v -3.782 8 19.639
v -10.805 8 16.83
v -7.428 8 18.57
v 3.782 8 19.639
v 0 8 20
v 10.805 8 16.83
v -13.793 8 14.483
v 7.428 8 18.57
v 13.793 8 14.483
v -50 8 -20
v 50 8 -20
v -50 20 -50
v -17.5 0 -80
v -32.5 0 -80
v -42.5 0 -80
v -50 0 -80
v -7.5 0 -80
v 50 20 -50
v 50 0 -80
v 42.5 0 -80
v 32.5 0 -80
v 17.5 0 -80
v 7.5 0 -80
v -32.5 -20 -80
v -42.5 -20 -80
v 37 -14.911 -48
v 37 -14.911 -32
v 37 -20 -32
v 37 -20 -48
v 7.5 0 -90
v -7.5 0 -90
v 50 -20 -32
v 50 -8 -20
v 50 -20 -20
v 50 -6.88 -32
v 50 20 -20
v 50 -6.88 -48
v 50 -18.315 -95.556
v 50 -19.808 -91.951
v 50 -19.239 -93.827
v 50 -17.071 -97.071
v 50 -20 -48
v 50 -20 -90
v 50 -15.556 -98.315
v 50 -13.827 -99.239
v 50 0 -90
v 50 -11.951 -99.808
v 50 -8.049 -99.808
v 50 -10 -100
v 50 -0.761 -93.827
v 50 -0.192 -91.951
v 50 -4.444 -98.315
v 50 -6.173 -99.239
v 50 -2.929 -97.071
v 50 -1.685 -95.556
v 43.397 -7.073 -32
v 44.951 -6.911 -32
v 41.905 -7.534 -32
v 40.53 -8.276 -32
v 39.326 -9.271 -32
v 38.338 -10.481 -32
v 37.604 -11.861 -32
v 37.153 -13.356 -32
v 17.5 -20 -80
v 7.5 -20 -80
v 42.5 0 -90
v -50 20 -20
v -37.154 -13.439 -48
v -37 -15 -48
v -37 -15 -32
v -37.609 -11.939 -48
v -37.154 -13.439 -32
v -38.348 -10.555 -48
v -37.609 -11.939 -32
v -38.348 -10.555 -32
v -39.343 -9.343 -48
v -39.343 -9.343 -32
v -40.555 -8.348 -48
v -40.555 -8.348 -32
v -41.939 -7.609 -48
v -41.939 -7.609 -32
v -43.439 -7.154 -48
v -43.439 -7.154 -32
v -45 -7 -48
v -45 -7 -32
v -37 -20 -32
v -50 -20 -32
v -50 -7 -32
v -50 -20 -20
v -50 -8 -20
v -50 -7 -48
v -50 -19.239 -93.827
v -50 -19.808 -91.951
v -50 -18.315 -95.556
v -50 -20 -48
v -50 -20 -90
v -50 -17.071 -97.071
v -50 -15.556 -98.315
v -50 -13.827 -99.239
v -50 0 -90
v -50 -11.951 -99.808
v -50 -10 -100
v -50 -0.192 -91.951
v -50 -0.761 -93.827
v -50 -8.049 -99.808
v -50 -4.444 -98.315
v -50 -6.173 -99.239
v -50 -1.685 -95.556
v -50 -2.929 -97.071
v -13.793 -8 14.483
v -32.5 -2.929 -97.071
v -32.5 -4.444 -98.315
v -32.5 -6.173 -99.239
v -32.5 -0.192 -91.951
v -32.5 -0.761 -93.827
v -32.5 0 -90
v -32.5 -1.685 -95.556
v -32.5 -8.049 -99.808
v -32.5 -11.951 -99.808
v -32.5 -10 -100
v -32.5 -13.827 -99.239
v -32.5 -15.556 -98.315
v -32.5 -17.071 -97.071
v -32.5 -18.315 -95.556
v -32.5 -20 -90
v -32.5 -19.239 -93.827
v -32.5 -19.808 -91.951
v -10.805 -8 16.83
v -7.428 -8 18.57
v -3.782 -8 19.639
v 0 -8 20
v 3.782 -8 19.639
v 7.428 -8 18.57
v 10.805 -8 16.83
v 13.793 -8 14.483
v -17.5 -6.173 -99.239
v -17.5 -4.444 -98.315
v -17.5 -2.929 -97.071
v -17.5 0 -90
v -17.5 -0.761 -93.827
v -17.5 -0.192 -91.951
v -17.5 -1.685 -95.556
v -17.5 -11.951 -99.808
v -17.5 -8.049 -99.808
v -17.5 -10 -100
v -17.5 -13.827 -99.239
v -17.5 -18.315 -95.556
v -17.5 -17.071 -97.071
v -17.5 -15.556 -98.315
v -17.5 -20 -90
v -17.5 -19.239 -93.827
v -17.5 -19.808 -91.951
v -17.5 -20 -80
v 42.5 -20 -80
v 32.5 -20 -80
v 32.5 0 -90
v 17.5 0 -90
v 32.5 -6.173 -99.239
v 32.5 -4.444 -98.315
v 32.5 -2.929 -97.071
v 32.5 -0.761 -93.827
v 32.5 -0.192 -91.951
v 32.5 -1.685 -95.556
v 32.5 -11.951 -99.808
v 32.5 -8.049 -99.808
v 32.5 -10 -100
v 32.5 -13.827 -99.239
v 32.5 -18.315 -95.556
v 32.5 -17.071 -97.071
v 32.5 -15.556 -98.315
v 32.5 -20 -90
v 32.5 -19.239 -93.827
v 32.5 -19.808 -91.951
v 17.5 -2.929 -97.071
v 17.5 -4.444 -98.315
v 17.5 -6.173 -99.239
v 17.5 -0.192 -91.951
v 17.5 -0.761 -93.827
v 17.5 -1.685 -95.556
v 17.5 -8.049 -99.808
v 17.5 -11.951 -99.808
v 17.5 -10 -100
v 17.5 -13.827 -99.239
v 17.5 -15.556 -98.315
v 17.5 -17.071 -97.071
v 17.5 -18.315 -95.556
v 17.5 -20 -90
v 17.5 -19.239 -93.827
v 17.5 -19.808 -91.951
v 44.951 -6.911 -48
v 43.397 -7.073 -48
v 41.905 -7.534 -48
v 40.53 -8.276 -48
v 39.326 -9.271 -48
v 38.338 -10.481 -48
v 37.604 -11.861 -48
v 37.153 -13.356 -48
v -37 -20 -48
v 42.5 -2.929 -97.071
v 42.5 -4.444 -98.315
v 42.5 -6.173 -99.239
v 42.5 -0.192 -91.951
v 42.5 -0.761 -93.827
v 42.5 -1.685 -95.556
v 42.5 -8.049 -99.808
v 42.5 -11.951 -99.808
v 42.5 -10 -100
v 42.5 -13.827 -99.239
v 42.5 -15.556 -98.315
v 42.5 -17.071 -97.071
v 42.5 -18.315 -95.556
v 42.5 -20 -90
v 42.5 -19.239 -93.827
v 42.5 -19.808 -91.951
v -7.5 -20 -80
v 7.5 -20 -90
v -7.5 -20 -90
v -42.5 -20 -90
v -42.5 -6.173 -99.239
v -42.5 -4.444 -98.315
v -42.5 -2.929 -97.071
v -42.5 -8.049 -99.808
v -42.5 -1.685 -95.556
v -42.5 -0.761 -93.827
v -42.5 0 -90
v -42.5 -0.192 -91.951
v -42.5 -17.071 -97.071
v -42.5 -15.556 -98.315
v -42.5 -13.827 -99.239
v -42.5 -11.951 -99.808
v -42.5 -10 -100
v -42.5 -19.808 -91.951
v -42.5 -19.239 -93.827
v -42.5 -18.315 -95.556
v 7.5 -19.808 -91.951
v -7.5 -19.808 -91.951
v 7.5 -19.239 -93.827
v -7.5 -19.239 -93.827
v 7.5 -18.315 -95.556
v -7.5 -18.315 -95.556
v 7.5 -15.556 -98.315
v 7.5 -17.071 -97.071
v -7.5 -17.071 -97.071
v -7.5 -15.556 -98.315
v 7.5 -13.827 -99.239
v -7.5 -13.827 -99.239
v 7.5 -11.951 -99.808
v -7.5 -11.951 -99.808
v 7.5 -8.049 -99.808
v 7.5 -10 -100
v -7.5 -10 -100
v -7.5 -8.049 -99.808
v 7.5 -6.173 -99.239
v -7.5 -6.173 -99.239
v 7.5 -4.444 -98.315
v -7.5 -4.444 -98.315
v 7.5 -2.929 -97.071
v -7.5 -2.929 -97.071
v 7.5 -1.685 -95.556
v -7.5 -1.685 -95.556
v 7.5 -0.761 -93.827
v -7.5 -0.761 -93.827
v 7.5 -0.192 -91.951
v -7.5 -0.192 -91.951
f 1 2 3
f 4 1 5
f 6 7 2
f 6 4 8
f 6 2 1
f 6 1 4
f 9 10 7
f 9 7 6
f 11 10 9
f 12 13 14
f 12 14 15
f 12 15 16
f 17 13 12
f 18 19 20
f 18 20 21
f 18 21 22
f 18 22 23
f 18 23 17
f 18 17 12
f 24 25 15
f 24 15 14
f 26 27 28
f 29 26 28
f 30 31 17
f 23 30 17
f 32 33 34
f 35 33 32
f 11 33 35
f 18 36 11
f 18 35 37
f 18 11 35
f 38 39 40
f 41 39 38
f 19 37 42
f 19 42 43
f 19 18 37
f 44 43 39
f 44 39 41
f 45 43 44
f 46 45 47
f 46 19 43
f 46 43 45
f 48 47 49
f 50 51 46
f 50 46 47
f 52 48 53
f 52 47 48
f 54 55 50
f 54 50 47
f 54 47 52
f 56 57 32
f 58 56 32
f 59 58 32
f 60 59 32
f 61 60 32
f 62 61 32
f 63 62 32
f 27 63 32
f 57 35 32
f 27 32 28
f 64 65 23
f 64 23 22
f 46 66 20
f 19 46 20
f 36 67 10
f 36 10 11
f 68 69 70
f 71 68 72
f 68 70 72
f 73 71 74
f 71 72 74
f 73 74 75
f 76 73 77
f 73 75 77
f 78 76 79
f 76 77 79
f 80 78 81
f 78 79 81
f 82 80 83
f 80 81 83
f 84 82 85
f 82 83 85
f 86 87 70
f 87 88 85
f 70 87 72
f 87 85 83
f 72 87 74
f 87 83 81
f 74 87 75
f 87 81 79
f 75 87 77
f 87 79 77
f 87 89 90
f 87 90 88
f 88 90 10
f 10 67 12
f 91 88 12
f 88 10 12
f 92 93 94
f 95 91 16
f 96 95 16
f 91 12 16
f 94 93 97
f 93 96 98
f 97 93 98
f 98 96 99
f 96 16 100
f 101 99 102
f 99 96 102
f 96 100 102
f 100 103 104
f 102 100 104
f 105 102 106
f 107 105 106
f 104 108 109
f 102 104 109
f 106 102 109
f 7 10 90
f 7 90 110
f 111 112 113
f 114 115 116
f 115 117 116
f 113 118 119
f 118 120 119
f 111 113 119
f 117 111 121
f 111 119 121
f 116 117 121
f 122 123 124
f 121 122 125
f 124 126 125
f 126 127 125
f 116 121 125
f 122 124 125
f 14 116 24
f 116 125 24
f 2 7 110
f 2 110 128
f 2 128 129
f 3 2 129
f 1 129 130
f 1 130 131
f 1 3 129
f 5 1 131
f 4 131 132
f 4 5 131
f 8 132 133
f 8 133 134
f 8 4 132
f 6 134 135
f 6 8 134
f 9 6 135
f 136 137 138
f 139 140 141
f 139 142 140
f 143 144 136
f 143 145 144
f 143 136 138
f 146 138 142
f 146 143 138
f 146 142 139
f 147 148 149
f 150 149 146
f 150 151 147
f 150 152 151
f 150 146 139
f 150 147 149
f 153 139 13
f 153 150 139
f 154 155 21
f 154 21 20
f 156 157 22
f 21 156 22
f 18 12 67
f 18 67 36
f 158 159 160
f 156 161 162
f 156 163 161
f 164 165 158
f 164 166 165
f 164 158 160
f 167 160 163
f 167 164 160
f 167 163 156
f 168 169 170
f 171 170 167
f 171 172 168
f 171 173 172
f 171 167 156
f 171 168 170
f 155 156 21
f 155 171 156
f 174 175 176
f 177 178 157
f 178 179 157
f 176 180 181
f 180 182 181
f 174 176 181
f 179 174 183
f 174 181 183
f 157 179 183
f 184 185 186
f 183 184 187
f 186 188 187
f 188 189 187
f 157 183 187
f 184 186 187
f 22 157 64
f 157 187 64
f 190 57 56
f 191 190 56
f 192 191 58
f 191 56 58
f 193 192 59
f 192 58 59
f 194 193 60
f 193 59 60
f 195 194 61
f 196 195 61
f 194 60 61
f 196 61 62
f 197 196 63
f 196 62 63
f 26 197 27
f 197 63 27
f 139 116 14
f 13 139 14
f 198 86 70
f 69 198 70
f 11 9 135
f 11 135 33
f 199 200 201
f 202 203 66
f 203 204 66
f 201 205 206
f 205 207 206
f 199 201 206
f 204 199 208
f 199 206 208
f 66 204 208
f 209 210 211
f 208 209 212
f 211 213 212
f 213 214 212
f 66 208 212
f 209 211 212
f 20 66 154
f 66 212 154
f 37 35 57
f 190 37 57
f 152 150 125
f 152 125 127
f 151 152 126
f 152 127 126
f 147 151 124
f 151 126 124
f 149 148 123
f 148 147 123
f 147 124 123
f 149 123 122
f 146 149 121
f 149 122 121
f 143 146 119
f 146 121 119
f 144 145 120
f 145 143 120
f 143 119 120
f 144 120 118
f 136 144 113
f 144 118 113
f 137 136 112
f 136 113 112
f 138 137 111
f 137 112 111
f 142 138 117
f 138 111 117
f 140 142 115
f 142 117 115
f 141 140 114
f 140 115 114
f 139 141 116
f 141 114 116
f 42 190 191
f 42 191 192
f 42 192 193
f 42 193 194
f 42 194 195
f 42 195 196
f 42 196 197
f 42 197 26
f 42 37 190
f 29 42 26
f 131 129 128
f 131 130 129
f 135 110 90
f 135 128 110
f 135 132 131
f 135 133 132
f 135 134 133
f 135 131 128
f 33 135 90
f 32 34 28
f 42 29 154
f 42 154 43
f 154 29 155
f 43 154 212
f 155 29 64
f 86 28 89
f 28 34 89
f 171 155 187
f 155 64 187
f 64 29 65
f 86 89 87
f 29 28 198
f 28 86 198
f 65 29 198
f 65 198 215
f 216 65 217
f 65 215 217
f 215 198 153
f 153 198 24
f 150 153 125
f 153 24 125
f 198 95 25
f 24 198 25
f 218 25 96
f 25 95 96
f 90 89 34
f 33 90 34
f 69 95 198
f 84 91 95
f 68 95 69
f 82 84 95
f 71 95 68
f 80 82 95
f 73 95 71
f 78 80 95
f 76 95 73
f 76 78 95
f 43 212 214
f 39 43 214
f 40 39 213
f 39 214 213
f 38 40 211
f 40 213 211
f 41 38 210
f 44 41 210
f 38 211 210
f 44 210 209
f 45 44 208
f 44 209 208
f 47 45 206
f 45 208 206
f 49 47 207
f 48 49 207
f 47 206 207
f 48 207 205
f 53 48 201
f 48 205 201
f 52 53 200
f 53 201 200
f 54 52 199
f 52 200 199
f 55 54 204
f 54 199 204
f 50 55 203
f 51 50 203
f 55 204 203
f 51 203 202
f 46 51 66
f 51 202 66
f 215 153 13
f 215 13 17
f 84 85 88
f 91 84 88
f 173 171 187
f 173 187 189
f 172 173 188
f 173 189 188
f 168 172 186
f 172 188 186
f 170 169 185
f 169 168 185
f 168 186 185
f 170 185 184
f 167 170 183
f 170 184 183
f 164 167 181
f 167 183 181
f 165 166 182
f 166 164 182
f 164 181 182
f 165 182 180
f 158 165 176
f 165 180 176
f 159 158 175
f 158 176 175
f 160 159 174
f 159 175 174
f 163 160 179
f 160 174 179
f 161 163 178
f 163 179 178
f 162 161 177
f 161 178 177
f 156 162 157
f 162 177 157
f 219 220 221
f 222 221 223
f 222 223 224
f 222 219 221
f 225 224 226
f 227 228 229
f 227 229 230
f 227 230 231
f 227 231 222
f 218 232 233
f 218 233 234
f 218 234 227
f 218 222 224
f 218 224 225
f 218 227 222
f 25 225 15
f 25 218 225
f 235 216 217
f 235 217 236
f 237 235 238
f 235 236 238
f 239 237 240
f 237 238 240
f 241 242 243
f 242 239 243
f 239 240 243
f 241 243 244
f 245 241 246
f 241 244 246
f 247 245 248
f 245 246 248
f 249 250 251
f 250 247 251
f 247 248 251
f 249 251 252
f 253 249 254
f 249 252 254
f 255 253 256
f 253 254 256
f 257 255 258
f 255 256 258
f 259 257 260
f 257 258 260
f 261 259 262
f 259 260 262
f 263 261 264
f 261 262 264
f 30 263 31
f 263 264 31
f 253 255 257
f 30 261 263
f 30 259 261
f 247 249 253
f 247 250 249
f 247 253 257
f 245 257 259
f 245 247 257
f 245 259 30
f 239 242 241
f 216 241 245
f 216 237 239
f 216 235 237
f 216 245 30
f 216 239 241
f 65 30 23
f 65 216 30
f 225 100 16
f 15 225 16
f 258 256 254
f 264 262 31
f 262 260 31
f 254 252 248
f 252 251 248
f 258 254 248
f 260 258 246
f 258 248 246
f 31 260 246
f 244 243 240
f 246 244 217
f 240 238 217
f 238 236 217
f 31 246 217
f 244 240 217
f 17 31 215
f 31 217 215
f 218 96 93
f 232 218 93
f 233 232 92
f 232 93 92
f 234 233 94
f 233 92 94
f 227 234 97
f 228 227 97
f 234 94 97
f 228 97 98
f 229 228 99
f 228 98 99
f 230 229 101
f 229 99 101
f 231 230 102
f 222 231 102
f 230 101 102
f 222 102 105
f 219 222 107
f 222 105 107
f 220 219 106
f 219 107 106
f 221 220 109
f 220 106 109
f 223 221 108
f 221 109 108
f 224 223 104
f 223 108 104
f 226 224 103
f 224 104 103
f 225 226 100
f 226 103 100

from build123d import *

# Parameters (mm, degrees)
EXTRUDE_1_DEPTH     = 20
SKETCH_2_W          = 106.736402143
SKETCH_2_H          = 47.429352318
CUT_EXTRUDE_1_DEPTH = 12
SKETCH_3_W          = 102.678215223
SKETCH_3_H          = 46.458192726
CUT_EXTRUDE_2_DEPTH = 12
CUT_EXTRUDE_3_DEPTH = 130.614813968
CUT_EXTRUDE_4_DEPTH = 16
EXTRUDE_4_DEPTH     = 100
SKETCH_8_W          = 10
SKETCH_8_H          = 20
CUT_EXTRUDE_6_DEPTH = 100
CUT_EXTRUDE_7_DEPTH = 16


with BuildPart() as part:
    # 草图1 → 凸台-拉伸1 (new, symmetric)
    with BuildSketch(Plane(origin=(0, 0, 0), x_dir=(1, 0, 0), z_dir=(0, 1, 0))):
        with BuildLine():
            Line((-50, 20), (-13.793103448, -14.482758621))
            ThreePointArc((-13.793103448, -14.482758621), (0, -20), (13.793103448, -14.482758621))
            Line((13.793103448, -14.482758621), (50, 20))
            Line((50, 20), (50, 80))
            Line((50, 80), (-50, 80))
            Line((-50, 80), (-50, 20))
        make_face()
    extrude(amount=EXTRUDE_1_DEPTH, both=True)

    # 草图2 → 切除-拉伸1 (cut)
    with BuildSketch(Plane(origin=(0, 20, 0), x_dir=(1, 0, 0), z_dir=(0, 1, 0))):
        with Locations((3.368201072, -3.714676159)):
            Rectangle(SKETCH_2_W, SKETCH_2_H)
    extrude(amount=-CUT_EXTRUDE_1_DEPTH, mode=Mode.SUBTRACT)

    # 草图3 → 切除-拉伸2 (cut)
    with BuildSketch(Plane.XZ.offset(20)):
        with Locations((1.339107612, 3.229096363)):
            Rectangle(SKETCH_3_W, SKETCH_3_H)
    extrude(amount=-CUT_EXTRUDE_2_DEPTH, mode=Mode.SUBTRACT)

    # 草图4 → 切除-拉伸3 (cut, through all)
    with BuildSketch(Plane(origin=(50, 0, 0), x_dir=(0, 0, -1), z_dir=(1, 0, 0))):
        Polygon((80, 0), (50, 20), (88.61691531, 20), (88.61691531, 0), align=None)
    extrude(amount=-CUT_EXTRUDE_3_DEPTH, mode=Mode.SUBTRACT)

    # Sketch 3D_1 → 切除-拉伸4 (cut)
    with BuildSketch(Plane(origin=(37, -14.910720316, -32), x_dir=(0.9127147422515467, 0.40859735593453445, 0), z_dir=(0, 0, -1))):
        with BuildLine():
            Line((0, 0), (-3.444952044, 7.6952493))
            Line((-3.444952044, 7.6952493), (4.401902282, 10.724720717))
            ThreePointArc((4.401902282, 10.724720717), (10.279015254, 10.694120637), (14.549253267, 6.655994763))
            Line((14.549253267, 6.655994763), (19.7295953, 0))
            Line((19.7295953, 0), (10.525702717, -4.05282768))
            ThreePointArc((10.525702717, -4.05282768), (4.4271171, -4.196920719), (0, 0))
        make_face()
    extrude(amount=CUT_EXTRUDE_4_DEPTH, mode=Mode.SUBTRACT)

    # 草图6 → 凸台-拉伸4 (add)
    with BuildSketch(Plane.ZY.offset(50)):
        with BuildLine():
            Line((-90, 0), (-80, 0))
            Line((-80, 0), (-80, -20))
            Line((-80, -20), (-90, -20))
            ThreePointArc((-90, -20), (-100, -10), (-90, 0))
        make_face()
    extrude(amount=-EXTRUDE_4_DEPTH)

    # 草图8 → 切除-拉伸6 (cut)
    with BuildSketch(Plane.XZ.offset(20)):
        with Locations((-37.5, -90)):
            Rectangle(SKETCH_8_W, SKETCH_8_H)
        with Locations((-12.5, -90)):
            Rectangle(SKETCH_8_W, SKETCH_8_H)
        with Locations((12.5, -90)):
            Rectangle(SKETCH_8_W, SKETCH_8_H)
        with Locations((37.5, -90)):
            Rectangle(SKETCH_8_W, SKETCH_8_H)
    extrude(amount=-CUT_EXTRUDE_6_DEPTH, mode=Mode.SUBTRACT)

    # 草图9 → 切除-拉伸7 (cut)
    with BuildSketch(Plane(origin=(0, 0, -32), x_dir=(-1, 0, 0), z_dir=(0, 0, -1))):
        with BuildLine():
            Line((45, -7), (50, -7))
            Line((50, -7), (59.459591305, -7))
            Line((59.459591305, -7), (59.459591305, -23))
            Line((59.459591305, -23), (37, -23))
            Line((37, -23), (37, -15))
            ThreePointArc((37, -15), (39.343145751, -9.343145751), (45, -7))
        make_face()
    extrude(amount=CUT_EXTRUDE_7_DEPTH, mode=Mode.SUBTRACT)


solid = part.part
